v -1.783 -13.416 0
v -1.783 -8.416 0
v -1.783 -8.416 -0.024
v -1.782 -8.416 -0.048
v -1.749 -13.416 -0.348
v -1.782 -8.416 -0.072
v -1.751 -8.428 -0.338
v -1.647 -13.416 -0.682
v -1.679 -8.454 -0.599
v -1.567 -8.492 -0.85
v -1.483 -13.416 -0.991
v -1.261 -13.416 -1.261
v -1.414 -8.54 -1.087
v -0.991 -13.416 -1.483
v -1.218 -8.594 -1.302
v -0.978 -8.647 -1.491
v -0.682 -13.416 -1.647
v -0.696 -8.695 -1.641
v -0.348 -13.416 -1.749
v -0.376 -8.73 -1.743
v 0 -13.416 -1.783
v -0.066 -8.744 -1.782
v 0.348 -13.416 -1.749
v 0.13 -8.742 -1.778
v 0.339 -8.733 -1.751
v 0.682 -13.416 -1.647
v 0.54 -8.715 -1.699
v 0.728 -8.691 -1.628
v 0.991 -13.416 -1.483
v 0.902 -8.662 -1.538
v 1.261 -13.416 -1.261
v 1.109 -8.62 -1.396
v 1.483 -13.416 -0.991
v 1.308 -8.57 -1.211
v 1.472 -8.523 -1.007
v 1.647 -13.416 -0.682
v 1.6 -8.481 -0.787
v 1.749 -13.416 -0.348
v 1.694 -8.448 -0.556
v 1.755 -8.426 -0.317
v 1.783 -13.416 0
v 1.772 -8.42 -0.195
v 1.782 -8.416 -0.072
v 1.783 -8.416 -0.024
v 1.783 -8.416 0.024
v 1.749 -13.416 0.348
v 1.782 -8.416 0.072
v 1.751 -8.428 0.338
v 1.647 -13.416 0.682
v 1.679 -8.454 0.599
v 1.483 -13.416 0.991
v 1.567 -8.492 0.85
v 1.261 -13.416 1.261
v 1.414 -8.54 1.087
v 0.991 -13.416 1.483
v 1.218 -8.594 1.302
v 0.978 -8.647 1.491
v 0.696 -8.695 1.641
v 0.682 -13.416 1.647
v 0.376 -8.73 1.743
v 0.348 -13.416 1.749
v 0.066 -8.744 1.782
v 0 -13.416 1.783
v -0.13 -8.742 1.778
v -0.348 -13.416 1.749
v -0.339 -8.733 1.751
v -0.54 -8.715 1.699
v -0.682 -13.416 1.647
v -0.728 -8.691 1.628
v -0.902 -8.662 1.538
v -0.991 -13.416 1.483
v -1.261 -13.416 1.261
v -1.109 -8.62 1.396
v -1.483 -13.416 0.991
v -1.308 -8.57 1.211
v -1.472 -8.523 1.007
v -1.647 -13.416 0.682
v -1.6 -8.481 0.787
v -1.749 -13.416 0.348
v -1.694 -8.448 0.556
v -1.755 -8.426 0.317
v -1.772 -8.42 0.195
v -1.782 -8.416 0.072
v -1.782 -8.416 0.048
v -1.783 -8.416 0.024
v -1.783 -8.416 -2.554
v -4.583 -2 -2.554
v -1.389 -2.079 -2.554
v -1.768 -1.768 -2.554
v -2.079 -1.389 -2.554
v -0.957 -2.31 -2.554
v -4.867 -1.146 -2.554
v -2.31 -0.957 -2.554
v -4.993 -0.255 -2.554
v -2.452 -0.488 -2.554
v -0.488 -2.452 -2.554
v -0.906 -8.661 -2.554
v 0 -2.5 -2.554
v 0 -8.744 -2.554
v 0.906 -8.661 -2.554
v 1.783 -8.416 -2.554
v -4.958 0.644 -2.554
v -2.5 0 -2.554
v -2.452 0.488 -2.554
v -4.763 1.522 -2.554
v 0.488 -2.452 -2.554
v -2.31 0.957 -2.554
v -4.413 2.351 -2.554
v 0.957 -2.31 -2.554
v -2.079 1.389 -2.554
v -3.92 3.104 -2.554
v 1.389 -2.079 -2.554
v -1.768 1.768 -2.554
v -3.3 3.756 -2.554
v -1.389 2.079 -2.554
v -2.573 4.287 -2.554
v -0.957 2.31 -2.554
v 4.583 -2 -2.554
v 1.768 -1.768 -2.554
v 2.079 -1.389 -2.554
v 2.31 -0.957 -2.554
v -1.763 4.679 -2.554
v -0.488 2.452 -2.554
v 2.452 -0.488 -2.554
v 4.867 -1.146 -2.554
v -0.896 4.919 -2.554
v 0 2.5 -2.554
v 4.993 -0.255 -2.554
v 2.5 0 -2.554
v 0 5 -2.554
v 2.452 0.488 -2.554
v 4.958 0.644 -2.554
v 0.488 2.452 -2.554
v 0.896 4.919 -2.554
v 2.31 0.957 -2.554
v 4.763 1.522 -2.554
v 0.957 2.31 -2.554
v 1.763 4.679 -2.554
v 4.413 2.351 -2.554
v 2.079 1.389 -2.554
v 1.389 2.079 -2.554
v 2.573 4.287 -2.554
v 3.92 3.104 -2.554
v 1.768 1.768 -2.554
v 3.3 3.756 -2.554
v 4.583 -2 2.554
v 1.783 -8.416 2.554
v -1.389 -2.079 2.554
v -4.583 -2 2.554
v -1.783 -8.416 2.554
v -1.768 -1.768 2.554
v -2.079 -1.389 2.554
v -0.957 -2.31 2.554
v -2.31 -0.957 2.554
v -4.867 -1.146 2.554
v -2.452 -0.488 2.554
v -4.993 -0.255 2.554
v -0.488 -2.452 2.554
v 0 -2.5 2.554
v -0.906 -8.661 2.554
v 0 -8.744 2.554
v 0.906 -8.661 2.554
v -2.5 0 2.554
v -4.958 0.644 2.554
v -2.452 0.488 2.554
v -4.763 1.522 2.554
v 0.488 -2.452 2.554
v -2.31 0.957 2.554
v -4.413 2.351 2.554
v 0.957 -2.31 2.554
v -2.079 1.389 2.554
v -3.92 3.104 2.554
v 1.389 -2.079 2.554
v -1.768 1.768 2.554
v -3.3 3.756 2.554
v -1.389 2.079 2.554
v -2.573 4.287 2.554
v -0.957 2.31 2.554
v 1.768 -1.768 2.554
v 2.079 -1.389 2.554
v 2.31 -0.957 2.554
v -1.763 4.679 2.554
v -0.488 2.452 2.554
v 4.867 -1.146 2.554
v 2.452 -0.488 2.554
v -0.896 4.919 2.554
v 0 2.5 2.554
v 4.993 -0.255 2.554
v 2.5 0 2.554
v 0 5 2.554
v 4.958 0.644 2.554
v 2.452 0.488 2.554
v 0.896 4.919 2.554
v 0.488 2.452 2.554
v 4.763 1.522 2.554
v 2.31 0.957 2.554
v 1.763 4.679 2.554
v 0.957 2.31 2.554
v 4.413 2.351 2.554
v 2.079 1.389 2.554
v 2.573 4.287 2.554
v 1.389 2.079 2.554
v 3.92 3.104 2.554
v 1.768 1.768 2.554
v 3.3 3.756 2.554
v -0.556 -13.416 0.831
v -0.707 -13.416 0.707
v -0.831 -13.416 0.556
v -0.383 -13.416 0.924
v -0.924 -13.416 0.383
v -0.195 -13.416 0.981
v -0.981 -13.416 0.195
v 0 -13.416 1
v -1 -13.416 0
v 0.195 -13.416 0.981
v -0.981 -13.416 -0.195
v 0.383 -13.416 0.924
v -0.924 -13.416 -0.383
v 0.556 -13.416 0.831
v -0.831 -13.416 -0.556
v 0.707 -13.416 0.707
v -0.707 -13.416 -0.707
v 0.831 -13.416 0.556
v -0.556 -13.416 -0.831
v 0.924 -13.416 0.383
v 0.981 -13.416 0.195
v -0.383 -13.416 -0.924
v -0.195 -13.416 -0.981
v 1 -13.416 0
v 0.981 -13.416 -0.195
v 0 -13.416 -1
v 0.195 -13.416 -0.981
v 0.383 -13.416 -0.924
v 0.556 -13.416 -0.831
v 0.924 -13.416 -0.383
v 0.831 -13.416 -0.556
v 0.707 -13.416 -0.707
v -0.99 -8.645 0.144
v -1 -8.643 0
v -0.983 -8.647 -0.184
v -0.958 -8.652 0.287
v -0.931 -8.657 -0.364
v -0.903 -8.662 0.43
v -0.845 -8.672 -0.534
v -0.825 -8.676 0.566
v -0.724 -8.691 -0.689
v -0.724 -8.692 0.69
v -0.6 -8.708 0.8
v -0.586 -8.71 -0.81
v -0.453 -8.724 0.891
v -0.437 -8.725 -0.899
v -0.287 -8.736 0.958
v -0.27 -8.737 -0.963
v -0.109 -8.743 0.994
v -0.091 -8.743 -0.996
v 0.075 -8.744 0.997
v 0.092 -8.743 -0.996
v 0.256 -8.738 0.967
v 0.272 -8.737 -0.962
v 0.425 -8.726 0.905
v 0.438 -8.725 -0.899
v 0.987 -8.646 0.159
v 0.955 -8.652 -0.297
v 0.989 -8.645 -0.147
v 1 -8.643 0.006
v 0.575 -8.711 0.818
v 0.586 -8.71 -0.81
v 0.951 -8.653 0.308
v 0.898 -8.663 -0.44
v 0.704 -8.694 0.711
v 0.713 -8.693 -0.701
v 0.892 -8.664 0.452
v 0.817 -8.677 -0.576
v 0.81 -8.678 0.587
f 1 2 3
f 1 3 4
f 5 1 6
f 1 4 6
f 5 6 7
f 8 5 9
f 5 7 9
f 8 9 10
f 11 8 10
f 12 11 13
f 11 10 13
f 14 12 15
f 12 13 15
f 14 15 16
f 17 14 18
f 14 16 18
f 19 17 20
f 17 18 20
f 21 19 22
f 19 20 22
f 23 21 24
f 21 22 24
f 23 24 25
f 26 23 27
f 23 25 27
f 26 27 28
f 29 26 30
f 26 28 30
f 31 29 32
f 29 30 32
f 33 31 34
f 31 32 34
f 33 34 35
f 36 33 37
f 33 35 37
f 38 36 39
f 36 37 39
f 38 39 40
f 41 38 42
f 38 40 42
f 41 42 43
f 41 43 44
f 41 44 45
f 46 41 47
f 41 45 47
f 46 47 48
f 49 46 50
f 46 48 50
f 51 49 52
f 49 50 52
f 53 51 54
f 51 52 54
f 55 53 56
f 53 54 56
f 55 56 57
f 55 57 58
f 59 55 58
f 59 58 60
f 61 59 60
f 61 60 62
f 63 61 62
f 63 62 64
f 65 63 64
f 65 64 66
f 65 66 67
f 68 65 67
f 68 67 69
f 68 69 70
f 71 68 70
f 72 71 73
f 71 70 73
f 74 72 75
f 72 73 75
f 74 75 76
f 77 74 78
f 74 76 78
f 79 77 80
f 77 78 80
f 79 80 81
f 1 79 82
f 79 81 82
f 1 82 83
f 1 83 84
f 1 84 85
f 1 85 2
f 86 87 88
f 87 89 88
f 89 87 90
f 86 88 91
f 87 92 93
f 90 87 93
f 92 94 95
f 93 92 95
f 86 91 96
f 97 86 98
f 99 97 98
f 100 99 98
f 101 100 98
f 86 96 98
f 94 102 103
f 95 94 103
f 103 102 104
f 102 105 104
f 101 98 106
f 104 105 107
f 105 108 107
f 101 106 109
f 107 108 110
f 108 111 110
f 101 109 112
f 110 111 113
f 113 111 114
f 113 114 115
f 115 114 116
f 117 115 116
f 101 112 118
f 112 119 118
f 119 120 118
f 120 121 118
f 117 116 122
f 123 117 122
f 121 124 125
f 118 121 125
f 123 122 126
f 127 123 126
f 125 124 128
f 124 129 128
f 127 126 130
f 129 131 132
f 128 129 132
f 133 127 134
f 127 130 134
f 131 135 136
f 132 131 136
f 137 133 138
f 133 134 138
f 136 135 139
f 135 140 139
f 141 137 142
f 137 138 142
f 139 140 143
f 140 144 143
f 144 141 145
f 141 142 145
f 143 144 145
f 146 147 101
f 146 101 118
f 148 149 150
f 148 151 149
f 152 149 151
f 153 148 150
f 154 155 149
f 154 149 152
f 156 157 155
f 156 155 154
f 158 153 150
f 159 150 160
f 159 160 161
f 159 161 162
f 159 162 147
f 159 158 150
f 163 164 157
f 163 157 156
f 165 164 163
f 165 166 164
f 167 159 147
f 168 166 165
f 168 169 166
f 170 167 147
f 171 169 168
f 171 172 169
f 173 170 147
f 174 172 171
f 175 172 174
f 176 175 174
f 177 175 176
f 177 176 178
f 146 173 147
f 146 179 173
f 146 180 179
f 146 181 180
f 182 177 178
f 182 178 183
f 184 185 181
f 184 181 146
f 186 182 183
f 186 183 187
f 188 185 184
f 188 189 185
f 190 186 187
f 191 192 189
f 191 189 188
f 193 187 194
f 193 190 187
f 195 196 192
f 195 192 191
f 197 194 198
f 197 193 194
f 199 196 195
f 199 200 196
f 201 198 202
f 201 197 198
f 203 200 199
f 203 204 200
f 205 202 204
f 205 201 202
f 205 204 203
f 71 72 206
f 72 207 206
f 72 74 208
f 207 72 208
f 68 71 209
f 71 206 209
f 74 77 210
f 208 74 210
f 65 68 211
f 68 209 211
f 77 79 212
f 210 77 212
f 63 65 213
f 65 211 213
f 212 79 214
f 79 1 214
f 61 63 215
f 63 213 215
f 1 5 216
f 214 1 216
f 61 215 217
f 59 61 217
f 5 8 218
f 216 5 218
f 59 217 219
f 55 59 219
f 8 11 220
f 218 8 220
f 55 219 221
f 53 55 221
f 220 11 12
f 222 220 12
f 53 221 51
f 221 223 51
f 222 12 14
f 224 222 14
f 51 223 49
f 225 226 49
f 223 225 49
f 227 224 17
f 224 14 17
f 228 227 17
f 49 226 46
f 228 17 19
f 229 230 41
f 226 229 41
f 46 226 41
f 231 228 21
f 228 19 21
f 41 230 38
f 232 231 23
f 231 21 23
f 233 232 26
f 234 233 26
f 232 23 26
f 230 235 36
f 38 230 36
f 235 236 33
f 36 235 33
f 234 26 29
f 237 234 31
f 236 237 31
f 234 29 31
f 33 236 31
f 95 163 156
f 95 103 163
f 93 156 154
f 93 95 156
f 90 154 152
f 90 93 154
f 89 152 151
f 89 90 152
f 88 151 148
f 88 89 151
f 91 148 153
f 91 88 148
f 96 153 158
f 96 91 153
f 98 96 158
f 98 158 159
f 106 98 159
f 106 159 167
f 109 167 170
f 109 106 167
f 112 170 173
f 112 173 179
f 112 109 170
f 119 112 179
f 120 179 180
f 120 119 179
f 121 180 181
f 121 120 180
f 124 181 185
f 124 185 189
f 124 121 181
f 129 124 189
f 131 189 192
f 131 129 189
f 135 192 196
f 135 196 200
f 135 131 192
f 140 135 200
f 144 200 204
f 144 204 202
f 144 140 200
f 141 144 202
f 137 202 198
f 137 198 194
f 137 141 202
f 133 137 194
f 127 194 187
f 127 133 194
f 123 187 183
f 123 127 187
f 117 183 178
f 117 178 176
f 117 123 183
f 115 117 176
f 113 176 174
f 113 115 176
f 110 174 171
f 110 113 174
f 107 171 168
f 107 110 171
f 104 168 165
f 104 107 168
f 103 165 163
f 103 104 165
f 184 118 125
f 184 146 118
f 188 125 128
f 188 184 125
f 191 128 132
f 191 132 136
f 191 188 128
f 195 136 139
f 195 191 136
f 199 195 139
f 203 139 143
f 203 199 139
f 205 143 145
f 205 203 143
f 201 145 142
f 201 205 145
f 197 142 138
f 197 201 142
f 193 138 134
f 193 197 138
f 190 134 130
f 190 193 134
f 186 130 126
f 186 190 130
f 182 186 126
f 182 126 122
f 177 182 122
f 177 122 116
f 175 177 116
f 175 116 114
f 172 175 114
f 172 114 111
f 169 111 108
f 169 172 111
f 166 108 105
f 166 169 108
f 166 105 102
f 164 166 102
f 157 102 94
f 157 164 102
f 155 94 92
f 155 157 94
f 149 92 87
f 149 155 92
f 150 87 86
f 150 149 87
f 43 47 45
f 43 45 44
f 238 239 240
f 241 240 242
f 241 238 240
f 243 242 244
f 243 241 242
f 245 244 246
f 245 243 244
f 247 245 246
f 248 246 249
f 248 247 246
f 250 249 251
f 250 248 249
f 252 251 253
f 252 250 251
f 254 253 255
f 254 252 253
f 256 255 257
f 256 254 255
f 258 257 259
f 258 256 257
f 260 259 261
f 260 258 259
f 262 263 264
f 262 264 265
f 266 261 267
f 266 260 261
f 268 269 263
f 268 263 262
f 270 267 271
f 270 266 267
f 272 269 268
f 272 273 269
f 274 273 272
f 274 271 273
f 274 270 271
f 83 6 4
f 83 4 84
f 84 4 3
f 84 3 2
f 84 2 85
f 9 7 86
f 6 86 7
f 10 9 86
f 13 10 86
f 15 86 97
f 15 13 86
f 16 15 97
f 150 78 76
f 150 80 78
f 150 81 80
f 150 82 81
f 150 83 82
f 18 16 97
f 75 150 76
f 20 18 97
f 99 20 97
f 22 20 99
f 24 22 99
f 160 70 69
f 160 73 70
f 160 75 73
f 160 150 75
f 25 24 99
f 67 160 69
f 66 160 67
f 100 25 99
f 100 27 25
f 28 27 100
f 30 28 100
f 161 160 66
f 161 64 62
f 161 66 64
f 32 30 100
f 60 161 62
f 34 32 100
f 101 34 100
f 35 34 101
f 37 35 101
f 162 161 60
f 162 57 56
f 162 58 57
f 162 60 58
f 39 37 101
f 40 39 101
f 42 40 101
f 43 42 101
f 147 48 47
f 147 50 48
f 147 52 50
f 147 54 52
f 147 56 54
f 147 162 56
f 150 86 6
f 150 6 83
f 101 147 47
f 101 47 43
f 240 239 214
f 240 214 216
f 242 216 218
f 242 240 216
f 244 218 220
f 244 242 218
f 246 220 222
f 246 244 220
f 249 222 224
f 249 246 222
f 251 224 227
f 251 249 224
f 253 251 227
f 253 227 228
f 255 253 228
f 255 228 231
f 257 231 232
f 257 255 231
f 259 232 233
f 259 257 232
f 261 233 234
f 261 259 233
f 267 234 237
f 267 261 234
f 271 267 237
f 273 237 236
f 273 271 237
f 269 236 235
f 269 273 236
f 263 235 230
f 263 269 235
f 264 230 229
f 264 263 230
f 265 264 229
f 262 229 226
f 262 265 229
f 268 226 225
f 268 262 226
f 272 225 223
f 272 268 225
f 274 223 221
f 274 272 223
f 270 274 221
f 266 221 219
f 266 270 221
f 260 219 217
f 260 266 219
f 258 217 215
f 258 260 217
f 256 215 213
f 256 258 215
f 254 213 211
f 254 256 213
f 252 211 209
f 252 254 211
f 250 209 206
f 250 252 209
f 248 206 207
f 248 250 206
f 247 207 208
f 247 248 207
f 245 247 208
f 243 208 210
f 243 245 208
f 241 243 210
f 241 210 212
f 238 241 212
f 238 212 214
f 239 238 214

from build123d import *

# Parameters (mm, degrees)
SKETCH1_R           = 2.5
BOSS_EXTRUDE1_DEPTH = 2.5535
SKETCH2_W           = 0.783
SKETCH2_H           = 5


with BuildPart() as part:
    # Sketch1 → Boss-Extrude1 (new, symmetric)
    with BuildSketch(Plane.XY):
        with BuildLine():
            Line((-4.582575695, -2), (-1.782575695, -8.415605973))
            ThreePointArc((-1.782575695, -8.415605973), (0, -8.744158243), (1.782575695, -8.415605973))
            Line((1.782575695, -8.415605973), (4.582575695, -2))
            ThreePointArc((4.582575695, -2), (0, 5), (-4.582575695, -2))
        make_face()
        with Locations(Location((0, 0, 0), (0, 0, 180))):
            Circle(SKETCH1_R, mode=Mode.SUBTRACT)
    extrude(amount=BOSS_EXTRUDE1_DEPTH, both=True)

    # Sketch2 → Revolve1 (revolve)
    with BuildSketch(Plane.XY, mode=Mode.PRIVATE) as revolve1_sk:
        with Locations((1.3915, -10.916)):
            Rectangle(SKETCH2_W, SKETCH2_H)
    revolve(revolve1_sk.sketch.rotate(Axis((0, -8.744158243, 0), (0, -1, 0)), 180), axis=Axis((0, -8.744158243, 0), (0, -1, 0)))


solid = part.part
